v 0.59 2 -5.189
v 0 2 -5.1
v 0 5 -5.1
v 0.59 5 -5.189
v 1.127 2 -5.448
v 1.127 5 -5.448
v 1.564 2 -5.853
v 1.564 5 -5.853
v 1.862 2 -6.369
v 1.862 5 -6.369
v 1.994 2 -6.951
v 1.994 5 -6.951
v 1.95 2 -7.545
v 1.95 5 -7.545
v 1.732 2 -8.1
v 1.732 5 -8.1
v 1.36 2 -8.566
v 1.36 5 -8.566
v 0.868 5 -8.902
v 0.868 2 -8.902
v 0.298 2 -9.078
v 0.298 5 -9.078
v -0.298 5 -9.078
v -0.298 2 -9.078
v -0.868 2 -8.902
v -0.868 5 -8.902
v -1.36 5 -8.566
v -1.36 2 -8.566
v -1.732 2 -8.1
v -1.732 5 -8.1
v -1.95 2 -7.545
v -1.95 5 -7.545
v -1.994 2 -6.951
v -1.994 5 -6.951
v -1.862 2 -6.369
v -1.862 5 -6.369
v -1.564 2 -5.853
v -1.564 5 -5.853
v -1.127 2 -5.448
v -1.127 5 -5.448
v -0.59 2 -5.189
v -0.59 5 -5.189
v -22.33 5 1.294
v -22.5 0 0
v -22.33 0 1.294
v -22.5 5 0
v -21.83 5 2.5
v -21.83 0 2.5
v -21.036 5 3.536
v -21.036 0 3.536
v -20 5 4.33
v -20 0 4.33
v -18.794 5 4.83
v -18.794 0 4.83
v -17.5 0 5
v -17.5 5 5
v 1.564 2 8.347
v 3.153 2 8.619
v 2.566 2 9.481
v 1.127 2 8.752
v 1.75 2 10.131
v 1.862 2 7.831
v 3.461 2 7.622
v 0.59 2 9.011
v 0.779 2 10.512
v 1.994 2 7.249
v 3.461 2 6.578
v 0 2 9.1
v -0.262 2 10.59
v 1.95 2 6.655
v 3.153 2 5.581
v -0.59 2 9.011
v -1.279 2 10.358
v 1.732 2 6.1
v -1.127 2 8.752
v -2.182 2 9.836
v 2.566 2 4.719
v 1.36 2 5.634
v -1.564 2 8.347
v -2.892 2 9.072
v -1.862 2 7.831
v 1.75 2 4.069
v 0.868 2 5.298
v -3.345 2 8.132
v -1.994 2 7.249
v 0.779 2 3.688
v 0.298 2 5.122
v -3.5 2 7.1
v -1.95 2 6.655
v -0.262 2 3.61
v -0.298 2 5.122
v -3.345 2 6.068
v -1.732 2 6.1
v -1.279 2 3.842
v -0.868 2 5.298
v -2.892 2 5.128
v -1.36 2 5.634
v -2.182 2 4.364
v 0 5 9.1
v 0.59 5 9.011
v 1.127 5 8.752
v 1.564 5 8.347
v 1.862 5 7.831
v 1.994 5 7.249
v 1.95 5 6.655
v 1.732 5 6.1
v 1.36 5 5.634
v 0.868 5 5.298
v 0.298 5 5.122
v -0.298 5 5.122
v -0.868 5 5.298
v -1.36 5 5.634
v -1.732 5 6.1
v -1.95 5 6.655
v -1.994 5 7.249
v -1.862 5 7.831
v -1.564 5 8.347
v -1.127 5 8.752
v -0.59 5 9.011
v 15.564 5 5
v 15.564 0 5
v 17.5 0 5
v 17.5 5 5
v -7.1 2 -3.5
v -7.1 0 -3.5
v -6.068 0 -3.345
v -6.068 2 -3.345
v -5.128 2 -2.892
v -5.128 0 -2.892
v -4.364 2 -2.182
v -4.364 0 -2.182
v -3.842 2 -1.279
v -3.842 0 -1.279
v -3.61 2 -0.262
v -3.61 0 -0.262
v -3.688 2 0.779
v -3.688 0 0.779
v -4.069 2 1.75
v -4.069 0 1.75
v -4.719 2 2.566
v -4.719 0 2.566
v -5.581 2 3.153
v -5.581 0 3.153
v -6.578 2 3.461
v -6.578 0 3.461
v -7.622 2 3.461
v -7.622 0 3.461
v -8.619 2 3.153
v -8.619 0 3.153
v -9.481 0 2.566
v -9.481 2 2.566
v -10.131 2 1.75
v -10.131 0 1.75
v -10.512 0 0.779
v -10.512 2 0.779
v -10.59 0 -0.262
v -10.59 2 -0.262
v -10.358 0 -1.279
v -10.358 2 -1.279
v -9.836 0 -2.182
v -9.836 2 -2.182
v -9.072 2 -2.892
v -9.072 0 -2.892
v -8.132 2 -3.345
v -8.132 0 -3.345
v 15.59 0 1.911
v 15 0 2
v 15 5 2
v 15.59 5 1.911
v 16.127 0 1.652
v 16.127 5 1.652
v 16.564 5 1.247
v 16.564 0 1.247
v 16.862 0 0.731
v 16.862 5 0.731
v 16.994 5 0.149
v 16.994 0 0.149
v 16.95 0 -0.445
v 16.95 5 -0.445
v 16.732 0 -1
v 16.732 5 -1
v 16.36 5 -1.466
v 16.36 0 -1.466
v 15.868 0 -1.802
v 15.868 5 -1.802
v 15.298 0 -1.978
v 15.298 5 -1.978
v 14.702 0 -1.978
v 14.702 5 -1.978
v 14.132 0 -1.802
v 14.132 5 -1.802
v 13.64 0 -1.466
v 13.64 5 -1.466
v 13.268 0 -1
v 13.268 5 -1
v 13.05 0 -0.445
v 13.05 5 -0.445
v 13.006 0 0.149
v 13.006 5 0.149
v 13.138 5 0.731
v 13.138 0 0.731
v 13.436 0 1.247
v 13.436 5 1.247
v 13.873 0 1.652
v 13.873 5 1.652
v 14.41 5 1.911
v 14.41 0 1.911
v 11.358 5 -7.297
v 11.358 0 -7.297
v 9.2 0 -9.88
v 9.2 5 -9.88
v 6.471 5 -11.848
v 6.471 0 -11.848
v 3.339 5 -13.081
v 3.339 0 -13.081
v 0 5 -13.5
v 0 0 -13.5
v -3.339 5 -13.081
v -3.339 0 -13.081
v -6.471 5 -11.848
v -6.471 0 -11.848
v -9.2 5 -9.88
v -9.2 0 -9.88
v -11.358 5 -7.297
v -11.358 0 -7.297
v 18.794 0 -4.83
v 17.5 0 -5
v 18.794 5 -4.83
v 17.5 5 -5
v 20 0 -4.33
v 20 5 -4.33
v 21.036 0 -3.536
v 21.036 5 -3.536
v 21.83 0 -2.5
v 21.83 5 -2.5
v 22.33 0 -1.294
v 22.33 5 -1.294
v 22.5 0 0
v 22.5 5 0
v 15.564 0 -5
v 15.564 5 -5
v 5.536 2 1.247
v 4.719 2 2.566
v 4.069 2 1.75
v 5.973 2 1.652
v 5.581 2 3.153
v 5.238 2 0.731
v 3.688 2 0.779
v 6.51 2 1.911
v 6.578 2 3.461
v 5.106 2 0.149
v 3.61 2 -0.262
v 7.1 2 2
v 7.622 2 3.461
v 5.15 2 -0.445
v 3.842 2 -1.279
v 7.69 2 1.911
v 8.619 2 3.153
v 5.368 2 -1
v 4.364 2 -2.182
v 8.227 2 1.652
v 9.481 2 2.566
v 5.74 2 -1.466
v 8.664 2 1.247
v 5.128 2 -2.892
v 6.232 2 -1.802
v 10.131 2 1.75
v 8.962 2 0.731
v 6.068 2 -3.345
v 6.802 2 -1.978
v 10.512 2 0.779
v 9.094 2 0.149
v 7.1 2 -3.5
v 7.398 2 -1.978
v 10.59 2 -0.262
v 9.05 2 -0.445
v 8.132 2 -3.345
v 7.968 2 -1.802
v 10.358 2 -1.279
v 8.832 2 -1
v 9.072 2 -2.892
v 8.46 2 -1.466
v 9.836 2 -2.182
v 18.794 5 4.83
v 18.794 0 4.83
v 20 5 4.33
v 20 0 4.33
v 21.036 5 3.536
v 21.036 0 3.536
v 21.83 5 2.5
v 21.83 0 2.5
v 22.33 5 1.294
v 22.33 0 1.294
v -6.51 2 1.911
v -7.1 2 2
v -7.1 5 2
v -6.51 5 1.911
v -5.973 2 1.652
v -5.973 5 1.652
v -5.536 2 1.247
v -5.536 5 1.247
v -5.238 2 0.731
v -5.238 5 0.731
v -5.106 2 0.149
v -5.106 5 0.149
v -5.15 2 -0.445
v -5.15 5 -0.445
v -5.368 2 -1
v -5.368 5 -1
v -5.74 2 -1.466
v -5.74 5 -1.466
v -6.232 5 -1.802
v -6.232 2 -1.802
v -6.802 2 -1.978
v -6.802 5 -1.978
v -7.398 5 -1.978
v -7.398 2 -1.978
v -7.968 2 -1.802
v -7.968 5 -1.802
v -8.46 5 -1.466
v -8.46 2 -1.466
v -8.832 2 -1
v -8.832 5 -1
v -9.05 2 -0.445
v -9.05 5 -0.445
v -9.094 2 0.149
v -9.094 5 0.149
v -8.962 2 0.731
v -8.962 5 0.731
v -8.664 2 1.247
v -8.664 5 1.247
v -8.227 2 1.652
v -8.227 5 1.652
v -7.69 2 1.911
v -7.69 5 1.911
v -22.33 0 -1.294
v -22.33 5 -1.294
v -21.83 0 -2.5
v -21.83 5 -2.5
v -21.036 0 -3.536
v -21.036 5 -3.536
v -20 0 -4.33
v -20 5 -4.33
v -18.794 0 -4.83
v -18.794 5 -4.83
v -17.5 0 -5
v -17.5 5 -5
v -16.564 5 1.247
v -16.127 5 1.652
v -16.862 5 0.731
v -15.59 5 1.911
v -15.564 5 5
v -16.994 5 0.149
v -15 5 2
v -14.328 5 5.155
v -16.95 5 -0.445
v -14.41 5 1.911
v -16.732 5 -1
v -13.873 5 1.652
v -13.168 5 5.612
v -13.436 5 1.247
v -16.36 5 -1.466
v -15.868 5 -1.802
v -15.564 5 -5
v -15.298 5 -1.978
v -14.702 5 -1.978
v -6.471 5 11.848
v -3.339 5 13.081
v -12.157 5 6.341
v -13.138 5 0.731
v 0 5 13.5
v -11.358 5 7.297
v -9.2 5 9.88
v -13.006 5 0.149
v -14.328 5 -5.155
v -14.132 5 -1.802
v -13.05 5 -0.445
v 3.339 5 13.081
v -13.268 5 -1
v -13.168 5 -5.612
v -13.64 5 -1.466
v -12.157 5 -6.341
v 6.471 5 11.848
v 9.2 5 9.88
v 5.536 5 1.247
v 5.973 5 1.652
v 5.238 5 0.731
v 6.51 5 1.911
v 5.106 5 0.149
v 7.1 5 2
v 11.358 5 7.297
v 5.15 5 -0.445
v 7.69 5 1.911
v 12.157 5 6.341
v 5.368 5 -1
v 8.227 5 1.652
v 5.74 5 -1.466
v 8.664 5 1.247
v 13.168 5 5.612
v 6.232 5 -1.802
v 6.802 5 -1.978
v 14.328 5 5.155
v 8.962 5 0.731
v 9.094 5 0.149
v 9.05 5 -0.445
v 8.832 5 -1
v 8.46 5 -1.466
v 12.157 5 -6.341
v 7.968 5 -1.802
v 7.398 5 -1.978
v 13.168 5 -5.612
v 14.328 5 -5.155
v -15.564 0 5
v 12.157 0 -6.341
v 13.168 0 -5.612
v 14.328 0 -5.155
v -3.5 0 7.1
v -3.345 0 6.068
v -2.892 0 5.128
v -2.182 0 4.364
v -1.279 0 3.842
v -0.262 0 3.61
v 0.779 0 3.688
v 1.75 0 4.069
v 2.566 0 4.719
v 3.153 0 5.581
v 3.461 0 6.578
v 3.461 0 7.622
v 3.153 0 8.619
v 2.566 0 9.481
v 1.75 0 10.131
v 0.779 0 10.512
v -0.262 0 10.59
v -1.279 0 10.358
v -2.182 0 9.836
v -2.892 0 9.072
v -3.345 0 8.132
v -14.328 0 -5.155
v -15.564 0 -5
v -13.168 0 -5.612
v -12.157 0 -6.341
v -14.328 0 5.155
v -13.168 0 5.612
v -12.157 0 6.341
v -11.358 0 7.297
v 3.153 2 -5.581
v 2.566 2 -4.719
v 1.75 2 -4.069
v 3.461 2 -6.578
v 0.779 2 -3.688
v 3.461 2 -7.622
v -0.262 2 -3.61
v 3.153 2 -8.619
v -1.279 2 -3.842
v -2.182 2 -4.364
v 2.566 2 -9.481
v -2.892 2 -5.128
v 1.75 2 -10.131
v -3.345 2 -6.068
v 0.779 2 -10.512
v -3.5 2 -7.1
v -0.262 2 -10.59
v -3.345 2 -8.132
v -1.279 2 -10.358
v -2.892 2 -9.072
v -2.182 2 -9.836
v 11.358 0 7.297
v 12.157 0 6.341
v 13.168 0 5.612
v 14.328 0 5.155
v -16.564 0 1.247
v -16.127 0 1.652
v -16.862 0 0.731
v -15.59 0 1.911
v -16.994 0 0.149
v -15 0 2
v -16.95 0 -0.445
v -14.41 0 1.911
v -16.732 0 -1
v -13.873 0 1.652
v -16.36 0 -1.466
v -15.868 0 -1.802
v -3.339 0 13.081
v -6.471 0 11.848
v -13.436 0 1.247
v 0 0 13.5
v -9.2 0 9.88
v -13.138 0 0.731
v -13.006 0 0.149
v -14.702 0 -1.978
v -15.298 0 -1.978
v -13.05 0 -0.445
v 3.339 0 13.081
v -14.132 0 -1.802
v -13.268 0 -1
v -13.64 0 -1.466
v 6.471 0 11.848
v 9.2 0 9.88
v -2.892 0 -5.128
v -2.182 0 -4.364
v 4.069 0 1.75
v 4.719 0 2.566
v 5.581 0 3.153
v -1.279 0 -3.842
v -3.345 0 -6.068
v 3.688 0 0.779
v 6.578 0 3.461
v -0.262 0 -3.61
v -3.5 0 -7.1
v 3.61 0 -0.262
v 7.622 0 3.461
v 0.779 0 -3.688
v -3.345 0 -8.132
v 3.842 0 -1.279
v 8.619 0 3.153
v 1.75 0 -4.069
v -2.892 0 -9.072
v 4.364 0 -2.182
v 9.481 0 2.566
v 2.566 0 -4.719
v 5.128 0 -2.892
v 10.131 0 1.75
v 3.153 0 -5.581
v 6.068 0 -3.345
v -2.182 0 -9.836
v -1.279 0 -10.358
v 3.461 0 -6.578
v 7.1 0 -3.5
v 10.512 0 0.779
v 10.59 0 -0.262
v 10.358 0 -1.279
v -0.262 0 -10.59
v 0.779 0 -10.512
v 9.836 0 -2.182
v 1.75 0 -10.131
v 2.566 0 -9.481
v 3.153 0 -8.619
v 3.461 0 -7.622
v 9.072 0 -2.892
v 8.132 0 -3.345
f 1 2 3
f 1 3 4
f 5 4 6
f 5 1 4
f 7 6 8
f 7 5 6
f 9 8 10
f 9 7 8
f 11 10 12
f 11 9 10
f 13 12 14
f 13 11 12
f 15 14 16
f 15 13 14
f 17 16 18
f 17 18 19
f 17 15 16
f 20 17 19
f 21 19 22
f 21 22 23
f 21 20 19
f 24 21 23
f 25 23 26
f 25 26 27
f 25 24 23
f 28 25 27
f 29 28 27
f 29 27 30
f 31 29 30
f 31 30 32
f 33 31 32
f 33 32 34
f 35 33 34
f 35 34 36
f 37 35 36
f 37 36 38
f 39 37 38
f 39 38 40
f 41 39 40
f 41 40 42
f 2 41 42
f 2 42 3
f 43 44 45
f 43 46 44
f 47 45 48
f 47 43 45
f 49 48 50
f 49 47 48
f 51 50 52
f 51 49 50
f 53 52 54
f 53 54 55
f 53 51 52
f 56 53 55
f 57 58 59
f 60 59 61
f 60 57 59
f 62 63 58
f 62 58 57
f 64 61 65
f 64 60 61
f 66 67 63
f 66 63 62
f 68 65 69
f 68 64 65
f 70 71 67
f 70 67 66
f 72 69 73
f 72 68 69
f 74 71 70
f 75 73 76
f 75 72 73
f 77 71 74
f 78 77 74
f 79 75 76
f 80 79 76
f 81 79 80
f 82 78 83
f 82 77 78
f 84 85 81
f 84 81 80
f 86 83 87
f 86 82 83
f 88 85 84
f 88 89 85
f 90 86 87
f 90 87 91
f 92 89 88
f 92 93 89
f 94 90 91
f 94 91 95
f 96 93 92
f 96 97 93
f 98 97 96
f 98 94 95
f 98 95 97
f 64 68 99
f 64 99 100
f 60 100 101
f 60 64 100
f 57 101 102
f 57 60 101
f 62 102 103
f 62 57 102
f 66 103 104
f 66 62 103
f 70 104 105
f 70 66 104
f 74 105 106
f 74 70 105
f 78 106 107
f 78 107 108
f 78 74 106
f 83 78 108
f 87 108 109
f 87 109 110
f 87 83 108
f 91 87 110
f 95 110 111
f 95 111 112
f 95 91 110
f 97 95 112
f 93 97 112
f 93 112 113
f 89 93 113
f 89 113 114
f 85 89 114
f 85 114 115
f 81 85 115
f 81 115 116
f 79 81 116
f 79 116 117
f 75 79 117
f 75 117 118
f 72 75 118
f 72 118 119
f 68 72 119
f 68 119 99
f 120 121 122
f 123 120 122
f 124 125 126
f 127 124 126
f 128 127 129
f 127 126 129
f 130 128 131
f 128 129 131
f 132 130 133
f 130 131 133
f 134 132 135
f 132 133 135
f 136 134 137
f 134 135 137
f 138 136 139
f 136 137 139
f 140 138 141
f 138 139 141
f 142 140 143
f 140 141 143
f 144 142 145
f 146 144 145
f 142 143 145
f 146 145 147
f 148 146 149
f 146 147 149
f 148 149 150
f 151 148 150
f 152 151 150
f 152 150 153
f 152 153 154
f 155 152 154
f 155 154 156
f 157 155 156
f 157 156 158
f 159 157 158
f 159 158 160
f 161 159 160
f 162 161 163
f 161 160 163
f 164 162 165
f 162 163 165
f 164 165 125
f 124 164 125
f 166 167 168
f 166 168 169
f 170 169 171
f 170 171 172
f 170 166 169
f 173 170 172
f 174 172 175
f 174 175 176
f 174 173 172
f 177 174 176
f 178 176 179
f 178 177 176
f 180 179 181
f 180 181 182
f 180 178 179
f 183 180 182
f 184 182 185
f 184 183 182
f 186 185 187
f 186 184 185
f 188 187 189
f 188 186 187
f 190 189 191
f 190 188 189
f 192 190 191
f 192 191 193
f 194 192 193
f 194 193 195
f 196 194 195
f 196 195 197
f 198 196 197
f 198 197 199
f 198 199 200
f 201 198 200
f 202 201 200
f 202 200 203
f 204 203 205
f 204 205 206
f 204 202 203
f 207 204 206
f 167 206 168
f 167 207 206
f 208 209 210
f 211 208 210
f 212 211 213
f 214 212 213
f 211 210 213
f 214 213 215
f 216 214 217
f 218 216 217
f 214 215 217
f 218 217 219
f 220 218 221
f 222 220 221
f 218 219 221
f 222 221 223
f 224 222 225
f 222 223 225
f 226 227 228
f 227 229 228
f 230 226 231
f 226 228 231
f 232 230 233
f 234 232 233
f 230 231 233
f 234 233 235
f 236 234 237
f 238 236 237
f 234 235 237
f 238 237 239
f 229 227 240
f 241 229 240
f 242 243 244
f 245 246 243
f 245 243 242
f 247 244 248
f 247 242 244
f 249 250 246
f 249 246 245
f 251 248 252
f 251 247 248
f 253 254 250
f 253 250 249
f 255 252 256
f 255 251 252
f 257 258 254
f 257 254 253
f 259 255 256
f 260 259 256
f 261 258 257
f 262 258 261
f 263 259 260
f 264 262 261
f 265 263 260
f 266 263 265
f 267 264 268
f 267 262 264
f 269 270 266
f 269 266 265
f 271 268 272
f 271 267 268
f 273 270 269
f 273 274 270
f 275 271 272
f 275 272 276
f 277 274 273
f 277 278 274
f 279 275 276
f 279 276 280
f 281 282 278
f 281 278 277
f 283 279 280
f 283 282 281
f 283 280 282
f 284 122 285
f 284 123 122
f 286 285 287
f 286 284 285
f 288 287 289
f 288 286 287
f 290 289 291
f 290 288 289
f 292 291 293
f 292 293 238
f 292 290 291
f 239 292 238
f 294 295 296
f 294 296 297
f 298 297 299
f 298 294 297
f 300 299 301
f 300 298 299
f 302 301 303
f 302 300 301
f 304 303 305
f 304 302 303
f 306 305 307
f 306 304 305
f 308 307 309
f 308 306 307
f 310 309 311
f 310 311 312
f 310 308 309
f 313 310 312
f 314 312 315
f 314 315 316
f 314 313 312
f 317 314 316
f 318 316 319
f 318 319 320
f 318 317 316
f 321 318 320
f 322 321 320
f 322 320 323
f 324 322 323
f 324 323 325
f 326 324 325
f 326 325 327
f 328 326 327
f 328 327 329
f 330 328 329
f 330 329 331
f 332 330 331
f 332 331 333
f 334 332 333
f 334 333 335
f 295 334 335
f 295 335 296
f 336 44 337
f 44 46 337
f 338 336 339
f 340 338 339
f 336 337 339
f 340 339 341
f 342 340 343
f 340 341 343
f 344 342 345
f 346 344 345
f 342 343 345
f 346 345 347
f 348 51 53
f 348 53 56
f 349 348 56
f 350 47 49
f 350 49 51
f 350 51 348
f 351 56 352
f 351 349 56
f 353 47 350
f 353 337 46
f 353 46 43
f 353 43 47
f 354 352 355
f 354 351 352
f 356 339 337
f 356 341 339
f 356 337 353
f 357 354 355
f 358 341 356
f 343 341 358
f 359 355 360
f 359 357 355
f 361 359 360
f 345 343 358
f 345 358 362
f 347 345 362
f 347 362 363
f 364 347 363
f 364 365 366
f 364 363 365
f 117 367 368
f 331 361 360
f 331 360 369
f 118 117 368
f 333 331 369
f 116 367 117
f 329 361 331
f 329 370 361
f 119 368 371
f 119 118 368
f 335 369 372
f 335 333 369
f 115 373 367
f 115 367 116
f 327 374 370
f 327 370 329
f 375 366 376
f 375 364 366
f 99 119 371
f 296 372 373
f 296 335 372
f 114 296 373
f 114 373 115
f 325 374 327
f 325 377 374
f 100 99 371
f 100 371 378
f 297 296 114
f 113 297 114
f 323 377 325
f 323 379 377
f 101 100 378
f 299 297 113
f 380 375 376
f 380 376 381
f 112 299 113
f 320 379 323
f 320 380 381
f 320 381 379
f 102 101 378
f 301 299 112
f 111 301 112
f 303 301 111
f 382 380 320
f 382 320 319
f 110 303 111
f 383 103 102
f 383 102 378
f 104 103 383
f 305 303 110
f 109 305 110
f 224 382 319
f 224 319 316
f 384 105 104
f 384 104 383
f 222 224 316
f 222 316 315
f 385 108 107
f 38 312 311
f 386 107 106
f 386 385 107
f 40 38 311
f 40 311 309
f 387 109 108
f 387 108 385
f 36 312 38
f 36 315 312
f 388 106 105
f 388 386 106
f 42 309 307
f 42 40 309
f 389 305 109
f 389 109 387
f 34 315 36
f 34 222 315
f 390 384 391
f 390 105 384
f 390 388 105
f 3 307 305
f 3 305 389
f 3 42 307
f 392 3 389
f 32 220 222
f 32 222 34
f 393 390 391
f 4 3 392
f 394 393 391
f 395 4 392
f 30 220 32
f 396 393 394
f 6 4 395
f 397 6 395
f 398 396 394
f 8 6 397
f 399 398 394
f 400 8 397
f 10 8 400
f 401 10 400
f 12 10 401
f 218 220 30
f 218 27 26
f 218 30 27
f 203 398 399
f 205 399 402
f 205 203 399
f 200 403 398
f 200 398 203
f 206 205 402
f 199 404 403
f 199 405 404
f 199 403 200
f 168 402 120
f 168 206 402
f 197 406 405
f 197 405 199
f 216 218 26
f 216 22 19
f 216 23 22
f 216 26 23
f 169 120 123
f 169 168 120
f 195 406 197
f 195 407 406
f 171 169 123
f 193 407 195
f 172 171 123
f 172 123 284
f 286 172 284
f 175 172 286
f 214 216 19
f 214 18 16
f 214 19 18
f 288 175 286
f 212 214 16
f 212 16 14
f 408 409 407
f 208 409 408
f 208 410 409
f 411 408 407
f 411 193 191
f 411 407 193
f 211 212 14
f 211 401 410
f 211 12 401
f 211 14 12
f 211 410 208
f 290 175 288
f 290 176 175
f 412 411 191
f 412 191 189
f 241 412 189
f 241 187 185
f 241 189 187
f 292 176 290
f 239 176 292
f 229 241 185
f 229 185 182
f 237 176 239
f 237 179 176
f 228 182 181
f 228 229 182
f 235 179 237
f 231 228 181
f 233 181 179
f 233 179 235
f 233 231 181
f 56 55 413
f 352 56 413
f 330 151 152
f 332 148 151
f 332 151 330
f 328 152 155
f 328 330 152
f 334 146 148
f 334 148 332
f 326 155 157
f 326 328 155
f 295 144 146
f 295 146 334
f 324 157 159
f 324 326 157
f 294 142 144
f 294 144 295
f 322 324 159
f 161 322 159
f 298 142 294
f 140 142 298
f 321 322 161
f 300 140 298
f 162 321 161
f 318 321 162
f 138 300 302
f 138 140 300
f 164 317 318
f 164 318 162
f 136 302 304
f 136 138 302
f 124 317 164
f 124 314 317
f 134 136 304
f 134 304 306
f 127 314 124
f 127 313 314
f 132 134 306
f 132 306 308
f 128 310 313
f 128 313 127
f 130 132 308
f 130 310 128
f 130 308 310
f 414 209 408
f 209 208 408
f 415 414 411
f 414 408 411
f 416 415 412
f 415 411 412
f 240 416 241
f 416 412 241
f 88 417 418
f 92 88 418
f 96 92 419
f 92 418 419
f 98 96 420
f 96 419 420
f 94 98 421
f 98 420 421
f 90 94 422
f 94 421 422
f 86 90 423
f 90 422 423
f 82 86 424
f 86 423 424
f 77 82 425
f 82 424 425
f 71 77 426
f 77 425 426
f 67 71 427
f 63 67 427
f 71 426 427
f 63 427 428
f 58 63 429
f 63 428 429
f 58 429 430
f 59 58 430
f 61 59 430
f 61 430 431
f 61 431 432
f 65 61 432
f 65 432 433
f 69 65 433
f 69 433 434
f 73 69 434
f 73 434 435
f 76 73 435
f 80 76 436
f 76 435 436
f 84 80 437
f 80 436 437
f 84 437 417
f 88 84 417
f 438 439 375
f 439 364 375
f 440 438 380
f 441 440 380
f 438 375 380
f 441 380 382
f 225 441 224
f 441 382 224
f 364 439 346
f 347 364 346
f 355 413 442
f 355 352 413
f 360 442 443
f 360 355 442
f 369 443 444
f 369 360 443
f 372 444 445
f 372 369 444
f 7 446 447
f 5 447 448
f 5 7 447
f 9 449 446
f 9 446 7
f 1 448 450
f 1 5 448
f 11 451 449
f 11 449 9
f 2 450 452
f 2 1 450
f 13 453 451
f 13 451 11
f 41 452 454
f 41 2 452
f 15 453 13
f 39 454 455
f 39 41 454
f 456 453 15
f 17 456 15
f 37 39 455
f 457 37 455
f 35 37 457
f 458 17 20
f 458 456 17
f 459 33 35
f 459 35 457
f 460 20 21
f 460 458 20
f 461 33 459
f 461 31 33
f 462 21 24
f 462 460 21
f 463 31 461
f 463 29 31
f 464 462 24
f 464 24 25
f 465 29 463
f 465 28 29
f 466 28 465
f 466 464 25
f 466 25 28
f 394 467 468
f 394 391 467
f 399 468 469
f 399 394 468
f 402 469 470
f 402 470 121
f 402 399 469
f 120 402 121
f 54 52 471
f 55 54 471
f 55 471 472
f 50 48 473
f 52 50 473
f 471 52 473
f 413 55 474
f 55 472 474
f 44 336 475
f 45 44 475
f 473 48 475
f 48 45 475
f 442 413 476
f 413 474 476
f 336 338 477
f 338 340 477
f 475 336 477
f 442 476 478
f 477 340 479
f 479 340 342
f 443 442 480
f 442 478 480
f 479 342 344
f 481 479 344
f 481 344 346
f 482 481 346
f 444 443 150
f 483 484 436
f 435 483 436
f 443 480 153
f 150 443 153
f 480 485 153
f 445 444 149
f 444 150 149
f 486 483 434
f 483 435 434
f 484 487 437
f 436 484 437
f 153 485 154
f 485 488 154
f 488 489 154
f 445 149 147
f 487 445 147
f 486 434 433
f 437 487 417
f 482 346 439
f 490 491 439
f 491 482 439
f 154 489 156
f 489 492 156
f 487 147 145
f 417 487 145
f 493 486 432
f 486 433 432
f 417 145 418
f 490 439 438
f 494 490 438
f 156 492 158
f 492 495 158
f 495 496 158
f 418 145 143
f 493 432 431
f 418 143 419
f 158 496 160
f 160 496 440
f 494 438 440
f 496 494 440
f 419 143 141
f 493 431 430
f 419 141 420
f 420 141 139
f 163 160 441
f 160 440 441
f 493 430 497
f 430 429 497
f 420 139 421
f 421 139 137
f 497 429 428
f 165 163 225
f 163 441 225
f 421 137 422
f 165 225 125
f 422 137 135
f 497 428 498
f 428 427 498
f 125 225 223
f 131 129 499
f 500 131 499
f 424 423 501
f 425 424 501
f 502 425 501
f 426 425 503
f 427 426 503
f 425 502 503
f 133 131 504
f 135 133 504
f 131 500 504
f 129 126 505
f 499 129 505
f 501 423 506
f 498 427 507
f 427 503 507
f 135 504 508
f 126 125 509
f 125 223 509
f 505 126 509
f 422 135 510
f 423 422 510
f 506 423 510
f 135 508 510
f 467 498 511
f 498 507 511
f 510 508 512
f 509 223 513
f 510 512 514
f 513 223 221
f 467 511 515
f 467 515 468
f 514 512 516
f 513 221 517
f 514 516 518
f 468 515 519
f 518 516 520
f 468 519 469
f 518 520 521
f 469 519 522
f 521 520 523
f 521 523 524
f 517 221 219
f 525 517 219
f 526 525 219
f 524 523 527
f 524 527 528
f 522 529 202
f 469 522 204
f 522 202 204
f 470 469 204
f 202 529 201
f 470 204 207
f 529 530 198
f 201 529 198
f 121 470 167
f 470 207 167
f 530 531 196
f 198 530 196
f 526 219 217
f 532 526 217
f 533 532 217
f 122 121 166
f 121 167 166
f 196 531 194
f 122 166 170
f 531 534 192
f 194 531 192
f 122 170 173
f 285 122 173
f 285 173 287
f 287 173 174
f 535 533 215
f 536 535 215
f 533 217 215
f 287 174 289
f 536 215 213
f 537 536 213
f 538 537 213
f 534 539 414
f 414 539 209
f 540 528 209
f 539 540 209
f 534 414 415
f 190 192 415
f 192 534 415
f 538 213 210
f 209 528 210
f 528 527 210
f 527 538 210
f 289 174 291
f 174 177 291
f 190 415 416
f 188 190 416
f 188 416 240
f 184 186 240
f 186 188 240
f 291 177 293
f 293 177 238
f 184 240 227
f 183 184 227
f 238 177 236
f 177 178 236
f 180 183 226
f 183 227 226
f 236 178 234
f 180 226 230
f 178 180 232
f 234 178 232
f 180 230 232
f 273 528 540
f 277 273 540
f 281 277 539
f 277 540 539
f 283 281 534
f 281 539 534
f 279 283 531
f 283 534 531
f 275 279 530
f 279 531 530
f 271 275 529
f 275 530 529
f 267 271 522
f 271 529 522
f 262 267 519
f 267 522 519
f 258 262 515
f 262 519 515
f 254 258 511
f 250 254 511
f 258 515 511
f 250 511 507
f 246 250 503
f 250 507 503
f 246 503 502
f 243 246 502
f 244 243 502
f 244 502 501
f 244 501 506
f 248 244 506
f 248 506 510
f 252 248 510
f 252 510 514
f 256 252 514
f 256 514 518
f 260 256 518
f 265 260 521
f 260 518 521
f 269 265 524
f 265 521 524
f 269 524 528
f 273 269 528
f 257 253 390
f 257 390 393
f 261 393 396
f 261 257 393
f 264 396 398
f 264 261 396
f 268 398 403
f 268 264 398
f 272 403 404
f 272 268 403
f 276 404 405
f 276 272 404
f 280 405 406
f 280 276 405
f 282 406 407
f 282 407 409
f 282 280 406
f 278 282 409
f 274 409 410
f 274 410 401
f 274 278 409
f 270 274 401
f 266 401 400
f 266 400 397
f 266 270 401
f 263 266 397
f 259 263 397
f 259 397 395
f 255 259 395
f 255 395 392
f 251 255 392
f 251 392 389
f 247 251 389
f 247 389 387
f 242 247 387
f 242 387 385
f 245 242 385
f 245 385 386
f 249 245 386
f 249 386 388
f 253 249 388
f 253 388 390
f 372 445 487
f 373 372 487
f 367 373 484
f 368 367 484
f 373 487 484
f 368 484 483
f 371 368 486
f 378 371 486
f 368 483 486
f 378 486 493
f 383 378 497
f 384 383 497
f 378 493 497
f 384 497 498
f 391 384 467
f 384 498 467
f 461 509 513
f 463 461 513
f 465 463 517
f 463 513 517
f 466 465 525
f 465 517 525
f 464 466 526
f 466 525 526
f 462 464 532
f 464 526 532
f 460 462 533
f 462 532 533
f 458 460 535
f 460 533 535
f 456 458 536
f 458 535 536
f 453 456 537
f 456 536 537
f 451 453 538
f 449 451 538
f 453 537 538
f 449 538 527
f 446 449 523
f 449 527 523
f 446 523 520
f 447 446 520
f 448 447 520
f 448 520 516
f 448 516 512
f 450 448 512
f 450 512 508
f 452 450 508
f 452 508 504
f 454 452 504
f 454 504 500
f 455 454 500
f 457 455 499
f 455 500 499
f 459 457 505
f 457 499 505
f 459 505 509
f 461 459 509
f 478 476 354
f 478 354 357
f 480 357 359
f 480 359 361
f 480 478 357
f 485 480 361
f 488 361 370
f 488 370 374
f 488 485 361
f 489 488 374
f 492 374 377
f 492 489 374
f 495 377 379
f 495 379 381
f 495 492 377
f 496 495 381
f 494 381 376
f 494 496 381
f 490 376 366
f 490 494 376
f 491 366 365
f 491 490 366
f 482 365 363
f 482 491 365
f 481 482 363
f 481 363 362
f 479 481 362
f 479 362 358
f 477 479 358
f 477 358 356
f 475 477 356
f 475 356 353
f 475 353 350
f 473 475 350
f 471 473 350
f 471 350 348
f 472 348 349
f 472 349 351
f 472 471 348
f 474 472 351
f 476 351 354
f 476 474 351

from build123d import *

# Parameters (mm, degrees)
SKETCH1_R           = 2
BOSS_EXTRUDE1_DEPTH = 5
FILLET1_R           = 5
FILLET2_R           = 5
SKETCH3_R           = 3.5
CUT_EXTRUDE2_DEPTH  = 2
CIRPATTERN1_COUNT   = 2
CIRPATTERN1_ANGLE   = 90


with BuildPart() as part:
    # Sketch1 → Boss-Extrude1 (new body)
    with BuildSketch(Plane(origin=(0, 0, 0), x_dir=(1, 0, 0), z_dir=(0, 1, 0))):
        with BuildLine():
            Line((-22.5, 5), (-22.5, -5))
            Line((-22.5, -5), (-12.539936204, -5))
            ThreePointArc((-12.539936204, -5), (0, -13.5), (12.539936204, -5))
            Line((12.539936204, -5), (22.5, -5))
            Line((22.5, -5), (22.5, 5))
            Line((22.5, 5), (12.539936204, 5))
            ThreePointArc((12.539936204, 5), (0, 13.5), (-12.539936204, 5))
            Line((-12.539936204, 5), (-22.5, 5))
        make_face()
        with Locations(Location((15, 0, 0), (0, 0, 270))):
            Circle(SKETCH1_R, mode=Mode.SUBTRACT)
        with Locations(Location((-15, 0, 0), (0, 0, 270))):
            Circle(SKETCH1_R, mode=Mode.SUBTRACT)
        with Locations(Location((-7.1, 0, 0), (0, 0, 270))):
            Circle(SKETCH1_R, mode=Mode.SUBTRACT)
        with Locations(Location((7.1, 0, 0), (0, 0, 270))):
            Circle(SKETCH1_R, mode=Mode.SUBTRACT)
        with Locations(Location((0, -7.1, 0), (0, 0, 270))):
            Circle(SKETCH1_R, mode=Mode.SUBTRACT)
        with Locations(Location((0, 7.1, 0), (0, 0, 270))):
            Circle(SKETCH1_R, mode=Mode.SUBTRACT)
    extrude(amount=BOSS_EXTRUDE1_DEPTH)

    # Fillet1
    fillet1_edges = [part.edges().sort_by_distance(p)[0] for p in [
        (-22.5, 2.5, -5),
        (-22.5, 2.5, 5),
        (22.5, 2.5, 5),
        (22.5, 2.5, -5),
    ]]
    fillet(fillet1_edges, radius=FILLET1_R - 0.0001)  # a hair under: the kernel refuses the full size

    # Fillet2
    fillet2_edges = [part.edges().sort_by_distance(p)[0] for p in [
        (-12.539936204, 2.5, -5),
        (12.539936204, 2.5, -5),
        (12.539936204, 2.5, 5),
        (-12.539936204, 2.5, 5),
    ]]
    fillet(fillet2_edges, radius=FILLET2_R)

    # Sketch3 → Cut-Extrude2 (cut)
    with BuildSketch(Plane.XZ):
        with Locations(Location((-7.1, 0, 0), (0, 0, 270))):
            Circle(SKETCH3_R)
        with Locations(Location((7.1, 0, 0), (0, 0, 270))):
            Circle(SKETCH3_R)
    cut_extrude2 = extrude(amount=-CUT_EXTRUDE2_DEPTH, mode=Mode.SUBTRACT)

    # CirPattern1: Cut-Extrude2 ×2 about axis
    cirpattern1_axis = Axis((0, 0, 0), (0, 1, 0))
    for i in range(1, CIRPATTERN1_COUNT):
        add(cut_extrude2.rotate(cirpattern1_axis, i * CIRPATTERN1_ANGLE / (CIRPATTERN1_COUNT - 1)), mode=Mode.SUBTRACT)


solid = part.part
